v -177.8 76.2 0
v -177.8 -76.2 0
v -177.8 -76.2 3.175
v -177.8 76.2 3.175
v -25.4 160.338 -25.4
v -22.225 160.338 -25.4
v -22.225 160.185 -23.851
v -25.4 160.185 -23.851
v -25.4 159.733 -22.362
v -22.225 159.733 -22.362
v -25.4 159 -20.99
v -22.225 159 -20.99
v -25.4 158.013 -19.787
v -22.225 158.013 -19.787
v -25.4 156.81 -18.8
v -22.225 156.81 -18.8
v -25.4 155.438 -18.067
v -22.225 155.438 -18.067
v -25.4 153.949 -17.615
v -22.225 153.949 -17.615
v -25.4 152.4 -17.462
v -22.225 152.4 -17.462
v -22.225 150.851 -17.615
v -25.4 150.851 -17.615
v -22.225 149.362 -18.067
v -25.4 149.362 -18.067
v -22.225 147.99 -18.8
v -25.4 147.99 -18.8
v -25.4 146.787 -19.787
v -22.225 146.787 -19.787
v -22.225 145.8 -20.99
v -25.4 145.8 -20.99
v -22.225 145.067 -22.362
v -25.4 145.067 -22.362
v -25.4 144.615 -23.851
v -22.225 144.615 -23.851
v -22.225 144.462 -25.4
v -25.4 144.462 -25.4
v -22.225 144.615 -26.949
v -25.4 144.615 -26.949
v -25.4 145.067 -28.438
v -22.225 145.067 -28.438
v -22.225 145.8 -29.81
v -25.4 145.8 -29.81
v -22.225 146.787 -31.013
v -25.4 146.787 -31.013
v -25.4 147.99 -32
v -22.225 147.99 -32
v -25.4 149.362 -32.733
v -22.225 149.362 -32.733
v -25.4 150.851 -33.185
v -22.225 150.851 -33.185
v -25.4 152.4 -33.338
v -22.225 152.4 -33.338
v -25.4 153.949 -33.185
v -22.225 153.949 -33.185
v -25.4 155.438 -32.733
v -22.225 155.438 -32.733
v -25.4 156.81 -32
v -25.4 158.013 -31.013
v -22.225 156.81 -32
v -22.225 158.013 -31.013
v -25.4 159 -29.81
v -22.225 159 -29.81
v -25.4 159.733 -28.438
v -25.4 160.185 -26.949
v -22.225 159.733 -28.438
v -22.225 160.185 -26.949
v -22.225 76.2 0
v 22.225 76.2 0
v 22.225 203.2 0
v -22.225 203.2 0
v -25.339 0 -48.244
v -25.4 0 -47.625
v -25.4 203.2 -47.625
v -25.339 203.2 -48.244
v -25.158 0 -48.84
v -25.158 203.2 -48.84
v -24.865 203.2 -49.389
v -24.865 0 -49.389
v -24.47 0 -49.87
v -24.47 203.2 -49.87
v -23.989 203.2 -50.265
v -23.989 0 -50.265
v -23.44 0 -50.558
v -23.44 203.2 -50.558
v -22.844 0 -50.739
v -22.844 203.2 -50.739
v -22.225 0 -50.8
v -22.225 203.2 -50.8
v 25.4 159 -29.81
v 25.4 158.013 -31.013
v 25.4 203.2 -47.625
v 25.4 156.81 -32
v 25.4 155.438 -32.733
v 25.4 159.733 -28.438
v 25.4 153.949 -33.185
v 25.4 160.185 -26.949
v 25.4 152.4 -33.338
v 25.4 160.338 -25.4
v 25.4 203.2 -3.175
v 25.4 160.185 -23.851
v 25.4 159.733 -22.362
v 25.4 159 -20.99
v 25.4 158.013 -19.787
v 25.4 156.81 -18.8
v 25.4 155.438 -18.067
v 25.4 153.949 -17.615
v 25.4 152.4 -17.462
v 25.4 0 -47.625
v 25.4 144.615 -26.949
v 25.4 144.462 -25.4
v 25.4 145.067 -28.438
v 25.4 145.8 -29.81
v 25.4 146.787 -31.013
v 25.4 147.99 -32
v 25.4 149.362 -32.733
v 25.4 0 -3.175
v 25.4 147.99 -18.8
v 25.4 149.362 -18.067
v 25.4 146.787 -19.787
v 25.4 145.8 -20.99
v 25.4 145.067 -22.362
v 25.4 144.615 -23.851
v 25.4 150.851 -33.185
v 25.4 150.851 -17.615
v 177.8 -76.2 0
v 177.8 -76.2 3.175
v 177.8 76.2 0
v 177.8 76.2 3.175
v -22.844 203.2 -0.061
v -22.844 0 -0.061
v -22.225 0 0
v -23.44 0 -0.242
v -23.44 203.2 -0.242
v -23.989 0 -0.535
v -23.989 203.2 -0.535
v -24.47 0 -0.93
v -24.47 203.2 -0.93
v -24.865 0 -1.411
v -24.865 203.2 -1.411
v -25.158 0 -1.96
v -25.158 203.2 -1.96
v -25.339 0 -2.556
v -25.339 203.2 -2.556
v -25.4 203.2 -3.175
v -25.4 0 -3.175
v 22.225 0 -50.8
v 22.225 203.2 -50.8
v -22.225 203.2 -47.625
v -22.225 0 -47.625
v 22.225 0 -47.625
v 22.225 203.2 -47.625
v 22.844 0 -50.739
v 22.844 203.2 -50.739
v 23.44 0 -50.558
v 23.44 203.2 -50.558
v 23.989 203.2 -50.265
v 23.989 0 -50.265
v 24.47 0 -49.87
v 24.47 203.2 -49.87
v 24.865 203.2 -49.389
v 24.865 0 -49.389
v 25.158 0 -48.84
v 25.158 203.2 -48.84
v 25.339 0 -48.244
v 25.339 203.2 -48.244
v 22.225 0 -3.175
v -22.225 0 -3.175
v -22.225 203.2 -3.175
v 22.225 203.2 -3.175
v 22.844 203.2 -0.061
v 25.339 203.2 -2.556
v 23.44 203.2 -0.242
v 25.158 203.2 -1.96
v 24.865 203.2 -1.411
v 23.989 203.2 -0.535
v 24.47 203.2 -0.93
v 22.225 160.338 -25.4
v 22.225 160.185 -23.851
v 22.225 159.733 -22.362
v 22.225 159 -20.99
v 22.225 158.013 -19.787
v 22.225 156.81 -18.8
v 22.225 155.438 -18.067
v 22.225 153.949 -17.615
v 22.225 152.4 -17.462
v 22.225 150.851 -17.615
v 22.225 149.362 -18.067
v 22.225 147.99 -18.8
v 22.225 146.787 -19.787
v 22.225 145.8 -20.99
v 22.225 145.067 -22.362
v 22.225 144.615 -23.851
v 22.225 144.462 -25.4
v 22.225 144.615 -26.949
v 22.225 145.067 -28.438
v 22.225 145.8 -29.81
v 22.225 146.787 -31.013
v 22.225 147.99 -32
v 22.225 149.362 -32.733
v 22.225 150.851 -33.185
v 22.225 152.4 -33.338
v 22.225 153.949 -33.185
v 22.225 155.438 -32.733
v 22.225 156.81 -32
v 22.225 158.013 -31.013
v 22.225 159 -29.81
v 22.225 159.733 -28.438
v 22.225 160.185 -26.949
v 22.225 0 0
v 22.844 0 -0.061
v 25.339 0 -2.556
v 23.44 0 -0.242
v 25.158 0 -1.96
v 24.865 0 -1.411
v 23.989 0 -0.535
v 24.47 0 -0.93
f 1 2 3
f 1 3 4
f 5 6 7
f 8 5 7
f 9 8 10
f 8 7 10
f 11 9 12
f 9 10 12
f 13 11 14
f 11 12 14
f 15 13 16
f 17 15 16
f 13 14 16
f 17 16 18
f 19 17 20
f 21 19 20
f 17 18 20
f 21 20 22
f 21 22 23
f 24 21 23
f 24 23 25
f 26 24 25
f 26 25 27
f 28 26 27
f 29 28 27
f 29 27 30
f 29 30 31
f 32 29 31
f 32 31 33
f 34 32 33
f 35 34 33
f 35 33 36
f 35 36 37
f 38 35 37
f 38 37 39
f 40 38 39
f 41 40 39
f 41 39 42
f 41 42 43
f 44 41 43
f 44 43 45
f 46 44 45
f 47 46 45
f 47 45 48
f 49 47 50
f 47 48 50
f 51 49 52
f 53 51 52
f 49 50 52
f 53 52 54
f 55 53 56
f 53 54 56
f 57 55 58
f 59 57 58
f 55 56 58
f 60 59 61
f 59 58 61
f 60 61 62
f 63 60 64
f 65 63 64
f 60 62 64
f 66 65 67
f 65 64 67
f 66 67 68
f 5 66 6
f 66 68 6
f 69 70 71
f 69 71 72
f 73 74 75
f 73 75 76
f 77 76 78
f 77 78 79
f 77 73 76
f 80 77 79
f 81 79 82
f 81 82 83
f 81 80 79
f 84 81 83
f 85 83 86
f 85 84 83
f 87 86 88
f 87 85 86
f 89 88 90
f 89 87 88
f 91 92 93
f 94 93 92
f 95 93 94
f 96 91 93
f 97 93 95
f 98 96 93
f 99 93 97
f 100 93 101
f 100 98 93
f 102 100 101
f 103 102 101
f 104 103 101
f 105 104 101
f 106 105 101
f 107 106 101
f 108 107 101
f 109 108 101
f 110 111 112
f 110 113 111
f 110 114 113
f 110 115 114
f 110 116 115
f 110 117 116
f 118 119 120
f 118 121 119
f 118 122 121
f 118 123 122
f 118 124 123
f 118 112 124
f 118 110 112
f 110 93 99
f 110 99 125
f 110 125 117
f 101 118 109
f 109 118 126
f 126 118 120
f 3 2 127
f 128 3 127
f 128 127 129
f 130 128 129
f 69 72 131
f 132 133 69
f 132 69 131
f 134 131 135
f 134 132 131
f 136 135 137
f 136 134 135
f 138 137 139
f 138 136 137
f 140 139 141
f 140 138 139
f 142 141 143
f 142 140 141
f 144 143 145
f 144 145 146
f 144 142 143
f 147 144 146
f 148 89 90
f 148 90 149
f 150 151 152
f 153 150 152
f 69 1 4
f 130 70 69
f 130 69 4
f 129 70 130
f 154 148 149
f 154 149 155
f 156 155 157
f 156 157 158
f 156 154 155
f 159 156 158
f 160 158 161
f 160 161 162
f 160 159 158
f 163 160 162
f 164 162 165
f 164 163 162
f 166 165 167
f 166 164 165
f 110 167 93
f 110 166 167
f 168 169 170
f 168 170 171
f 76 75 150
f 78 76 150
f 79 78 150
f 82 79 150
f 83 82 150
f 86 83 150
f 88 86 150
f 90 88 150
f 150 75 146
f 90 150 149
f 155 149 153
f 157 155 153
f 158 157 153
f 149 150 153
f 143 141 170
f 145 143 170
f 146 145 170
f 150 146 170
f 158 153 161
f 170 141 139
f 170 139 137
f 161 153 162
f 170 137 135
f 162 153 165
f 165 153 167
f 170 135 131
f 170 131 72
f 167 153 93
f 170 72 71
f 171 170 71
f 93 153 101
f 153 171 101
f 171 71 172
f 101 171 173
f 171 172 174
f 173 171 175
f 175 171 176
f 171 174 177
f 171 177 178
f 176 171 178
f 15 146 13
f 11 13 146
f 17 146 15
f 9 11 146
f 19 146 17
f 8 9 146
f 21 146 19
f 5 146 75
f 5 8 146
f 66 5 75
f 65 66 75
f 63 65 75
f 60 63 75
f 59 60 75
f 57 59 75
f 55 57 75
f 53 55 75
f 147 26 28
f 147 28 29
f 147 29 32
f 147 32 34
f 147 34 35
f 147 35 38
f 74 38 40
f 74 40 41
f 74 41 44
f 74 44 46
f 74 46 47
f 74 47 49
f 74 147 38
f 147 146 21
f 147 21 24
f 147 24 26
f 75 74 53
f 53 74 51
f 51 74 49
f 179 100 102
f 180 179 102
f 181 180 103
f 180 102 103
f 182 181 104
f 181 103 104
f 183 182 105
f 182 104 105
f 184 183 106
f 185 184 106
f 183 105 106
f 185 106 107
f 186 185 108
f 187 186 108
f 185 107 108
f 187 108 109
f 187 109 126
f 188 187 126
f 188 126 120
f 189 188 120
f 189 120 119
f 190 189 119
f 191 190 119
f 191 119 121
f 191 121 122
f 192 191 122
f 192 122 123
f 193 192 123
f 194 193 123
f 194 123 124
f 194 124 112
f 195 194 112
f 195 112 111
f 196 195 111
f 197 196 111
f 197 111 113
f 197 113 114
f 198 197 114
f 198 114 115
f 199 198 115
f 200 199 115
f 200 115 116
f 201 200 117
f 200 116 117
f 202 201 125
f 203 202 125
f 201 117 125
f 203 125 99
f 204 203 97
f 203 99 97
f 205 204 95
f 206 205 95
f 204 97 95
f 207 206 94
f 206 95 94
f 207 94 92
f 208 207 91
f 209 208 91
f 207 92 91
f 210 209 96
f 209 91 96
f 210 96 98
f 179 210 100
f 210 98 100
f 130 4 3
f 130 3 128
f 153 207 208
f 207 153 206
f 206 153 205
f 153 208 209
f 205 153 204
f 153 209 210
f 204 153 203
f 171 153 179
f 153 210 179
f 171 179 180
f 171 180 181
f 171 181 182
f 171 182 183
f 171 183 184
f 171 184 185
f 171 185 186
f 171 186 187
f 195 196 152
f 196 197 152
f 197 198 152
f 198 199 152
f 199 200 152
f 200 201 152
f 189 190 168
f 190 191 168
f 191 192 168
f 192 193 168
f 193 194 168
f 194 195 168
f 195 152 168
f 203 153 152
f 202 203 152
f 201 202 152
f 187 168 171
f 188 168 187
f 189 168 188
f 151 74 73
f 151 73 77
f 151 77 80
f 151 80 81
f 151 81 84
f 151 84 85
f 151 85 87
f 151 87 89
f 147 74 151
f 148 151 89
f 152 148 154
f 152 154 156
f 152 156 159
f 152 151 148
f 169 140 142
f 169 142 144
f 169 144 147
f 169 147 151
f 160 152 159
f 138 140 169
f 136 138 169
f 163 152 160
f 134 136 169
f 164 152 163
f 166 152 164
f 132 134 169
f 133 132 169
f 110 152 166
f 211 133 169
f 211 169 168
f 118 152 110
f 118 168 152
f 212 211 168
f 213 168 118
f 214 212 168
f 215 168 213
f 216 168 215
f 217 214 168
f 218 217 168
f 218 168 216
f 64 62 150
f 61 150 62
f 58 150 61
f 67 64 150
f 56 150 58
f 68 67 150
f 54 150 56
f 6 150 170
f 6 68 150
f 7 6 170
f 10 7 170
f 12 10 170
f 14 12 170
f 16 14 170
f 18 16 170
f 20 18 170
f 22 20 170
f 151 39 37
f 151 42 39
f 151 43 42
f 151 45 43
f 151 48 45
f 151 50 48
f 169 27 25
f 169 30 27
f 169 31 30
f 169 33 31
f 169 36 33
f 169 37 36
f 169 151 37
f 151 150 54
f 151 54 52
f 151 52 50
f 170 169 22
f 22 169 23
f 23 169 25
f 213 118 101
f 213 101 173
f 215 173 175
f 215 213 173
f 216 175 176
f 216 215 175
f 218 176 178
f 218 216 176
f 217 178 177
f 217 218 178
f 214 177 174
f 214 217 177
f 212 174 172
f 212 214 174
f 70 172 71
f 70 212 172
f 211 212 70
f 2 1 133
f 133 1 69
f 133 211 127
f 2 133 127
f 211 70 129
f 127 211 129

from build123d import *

# Parameters (mm, degrees)
F0_W     = 355.6
F0_H     = 152.4
F1_DEPTH = 3.175
F2_W     = 44.45
F2_H     = 44.45
F3_DEPTH = 203.2
F5_D     = 15.875


with BuildPart() as f1:
    # F0 (on Top) → F1 (new body)
    with BuildSketch(Plane.XY):
        Rectangle(F0_W, F0_H)
    extrude(amount=F1_DEPTH)

    # F2 (on Front) → F3 (join)
    with BuildSketch(Plane.XZ):
        with BuildLine():
            Line((22.225, 0), (-22.225, 0))
            ThreePointArc((-22.225, 0), (-24.470064, -0.929936), (-25.4, -3.175))
            Line((-25.4, -3.175), (-25.4, -47.625))
            ThreePointArc((-25.4, -47.625), (-24.470064, -49.870064), (-22.225, -50.8))
            Line((-22.225, -50.8), (22.225, -50.8))
            ThreePointArc((22.225, -50.8), (24.470064, -49.870064), (25.4, -47.625))
            Line((25.4, -47.625), (25.4, -3.175))
            ThreePointArc((25.4, -3.175), (24.470064, -0.929936), (22.225, 0))
        make_face()
        with Locations((0, -25.4)):
            Rectangle(F2_W, F2_H, mode=Mode.SUBTRACT)
    extrude(amount=-F3_DEPTH)

    # F5 (through all)
    with Locations(Plane(origin=(-25.4, 0, 0), x_dir=(0, -1, 0), z_dir=(-1, 0, 0))):
        with Locations((-152.4, -25.4)):
            Hole(F5_D / 2)


solid = f1.part
